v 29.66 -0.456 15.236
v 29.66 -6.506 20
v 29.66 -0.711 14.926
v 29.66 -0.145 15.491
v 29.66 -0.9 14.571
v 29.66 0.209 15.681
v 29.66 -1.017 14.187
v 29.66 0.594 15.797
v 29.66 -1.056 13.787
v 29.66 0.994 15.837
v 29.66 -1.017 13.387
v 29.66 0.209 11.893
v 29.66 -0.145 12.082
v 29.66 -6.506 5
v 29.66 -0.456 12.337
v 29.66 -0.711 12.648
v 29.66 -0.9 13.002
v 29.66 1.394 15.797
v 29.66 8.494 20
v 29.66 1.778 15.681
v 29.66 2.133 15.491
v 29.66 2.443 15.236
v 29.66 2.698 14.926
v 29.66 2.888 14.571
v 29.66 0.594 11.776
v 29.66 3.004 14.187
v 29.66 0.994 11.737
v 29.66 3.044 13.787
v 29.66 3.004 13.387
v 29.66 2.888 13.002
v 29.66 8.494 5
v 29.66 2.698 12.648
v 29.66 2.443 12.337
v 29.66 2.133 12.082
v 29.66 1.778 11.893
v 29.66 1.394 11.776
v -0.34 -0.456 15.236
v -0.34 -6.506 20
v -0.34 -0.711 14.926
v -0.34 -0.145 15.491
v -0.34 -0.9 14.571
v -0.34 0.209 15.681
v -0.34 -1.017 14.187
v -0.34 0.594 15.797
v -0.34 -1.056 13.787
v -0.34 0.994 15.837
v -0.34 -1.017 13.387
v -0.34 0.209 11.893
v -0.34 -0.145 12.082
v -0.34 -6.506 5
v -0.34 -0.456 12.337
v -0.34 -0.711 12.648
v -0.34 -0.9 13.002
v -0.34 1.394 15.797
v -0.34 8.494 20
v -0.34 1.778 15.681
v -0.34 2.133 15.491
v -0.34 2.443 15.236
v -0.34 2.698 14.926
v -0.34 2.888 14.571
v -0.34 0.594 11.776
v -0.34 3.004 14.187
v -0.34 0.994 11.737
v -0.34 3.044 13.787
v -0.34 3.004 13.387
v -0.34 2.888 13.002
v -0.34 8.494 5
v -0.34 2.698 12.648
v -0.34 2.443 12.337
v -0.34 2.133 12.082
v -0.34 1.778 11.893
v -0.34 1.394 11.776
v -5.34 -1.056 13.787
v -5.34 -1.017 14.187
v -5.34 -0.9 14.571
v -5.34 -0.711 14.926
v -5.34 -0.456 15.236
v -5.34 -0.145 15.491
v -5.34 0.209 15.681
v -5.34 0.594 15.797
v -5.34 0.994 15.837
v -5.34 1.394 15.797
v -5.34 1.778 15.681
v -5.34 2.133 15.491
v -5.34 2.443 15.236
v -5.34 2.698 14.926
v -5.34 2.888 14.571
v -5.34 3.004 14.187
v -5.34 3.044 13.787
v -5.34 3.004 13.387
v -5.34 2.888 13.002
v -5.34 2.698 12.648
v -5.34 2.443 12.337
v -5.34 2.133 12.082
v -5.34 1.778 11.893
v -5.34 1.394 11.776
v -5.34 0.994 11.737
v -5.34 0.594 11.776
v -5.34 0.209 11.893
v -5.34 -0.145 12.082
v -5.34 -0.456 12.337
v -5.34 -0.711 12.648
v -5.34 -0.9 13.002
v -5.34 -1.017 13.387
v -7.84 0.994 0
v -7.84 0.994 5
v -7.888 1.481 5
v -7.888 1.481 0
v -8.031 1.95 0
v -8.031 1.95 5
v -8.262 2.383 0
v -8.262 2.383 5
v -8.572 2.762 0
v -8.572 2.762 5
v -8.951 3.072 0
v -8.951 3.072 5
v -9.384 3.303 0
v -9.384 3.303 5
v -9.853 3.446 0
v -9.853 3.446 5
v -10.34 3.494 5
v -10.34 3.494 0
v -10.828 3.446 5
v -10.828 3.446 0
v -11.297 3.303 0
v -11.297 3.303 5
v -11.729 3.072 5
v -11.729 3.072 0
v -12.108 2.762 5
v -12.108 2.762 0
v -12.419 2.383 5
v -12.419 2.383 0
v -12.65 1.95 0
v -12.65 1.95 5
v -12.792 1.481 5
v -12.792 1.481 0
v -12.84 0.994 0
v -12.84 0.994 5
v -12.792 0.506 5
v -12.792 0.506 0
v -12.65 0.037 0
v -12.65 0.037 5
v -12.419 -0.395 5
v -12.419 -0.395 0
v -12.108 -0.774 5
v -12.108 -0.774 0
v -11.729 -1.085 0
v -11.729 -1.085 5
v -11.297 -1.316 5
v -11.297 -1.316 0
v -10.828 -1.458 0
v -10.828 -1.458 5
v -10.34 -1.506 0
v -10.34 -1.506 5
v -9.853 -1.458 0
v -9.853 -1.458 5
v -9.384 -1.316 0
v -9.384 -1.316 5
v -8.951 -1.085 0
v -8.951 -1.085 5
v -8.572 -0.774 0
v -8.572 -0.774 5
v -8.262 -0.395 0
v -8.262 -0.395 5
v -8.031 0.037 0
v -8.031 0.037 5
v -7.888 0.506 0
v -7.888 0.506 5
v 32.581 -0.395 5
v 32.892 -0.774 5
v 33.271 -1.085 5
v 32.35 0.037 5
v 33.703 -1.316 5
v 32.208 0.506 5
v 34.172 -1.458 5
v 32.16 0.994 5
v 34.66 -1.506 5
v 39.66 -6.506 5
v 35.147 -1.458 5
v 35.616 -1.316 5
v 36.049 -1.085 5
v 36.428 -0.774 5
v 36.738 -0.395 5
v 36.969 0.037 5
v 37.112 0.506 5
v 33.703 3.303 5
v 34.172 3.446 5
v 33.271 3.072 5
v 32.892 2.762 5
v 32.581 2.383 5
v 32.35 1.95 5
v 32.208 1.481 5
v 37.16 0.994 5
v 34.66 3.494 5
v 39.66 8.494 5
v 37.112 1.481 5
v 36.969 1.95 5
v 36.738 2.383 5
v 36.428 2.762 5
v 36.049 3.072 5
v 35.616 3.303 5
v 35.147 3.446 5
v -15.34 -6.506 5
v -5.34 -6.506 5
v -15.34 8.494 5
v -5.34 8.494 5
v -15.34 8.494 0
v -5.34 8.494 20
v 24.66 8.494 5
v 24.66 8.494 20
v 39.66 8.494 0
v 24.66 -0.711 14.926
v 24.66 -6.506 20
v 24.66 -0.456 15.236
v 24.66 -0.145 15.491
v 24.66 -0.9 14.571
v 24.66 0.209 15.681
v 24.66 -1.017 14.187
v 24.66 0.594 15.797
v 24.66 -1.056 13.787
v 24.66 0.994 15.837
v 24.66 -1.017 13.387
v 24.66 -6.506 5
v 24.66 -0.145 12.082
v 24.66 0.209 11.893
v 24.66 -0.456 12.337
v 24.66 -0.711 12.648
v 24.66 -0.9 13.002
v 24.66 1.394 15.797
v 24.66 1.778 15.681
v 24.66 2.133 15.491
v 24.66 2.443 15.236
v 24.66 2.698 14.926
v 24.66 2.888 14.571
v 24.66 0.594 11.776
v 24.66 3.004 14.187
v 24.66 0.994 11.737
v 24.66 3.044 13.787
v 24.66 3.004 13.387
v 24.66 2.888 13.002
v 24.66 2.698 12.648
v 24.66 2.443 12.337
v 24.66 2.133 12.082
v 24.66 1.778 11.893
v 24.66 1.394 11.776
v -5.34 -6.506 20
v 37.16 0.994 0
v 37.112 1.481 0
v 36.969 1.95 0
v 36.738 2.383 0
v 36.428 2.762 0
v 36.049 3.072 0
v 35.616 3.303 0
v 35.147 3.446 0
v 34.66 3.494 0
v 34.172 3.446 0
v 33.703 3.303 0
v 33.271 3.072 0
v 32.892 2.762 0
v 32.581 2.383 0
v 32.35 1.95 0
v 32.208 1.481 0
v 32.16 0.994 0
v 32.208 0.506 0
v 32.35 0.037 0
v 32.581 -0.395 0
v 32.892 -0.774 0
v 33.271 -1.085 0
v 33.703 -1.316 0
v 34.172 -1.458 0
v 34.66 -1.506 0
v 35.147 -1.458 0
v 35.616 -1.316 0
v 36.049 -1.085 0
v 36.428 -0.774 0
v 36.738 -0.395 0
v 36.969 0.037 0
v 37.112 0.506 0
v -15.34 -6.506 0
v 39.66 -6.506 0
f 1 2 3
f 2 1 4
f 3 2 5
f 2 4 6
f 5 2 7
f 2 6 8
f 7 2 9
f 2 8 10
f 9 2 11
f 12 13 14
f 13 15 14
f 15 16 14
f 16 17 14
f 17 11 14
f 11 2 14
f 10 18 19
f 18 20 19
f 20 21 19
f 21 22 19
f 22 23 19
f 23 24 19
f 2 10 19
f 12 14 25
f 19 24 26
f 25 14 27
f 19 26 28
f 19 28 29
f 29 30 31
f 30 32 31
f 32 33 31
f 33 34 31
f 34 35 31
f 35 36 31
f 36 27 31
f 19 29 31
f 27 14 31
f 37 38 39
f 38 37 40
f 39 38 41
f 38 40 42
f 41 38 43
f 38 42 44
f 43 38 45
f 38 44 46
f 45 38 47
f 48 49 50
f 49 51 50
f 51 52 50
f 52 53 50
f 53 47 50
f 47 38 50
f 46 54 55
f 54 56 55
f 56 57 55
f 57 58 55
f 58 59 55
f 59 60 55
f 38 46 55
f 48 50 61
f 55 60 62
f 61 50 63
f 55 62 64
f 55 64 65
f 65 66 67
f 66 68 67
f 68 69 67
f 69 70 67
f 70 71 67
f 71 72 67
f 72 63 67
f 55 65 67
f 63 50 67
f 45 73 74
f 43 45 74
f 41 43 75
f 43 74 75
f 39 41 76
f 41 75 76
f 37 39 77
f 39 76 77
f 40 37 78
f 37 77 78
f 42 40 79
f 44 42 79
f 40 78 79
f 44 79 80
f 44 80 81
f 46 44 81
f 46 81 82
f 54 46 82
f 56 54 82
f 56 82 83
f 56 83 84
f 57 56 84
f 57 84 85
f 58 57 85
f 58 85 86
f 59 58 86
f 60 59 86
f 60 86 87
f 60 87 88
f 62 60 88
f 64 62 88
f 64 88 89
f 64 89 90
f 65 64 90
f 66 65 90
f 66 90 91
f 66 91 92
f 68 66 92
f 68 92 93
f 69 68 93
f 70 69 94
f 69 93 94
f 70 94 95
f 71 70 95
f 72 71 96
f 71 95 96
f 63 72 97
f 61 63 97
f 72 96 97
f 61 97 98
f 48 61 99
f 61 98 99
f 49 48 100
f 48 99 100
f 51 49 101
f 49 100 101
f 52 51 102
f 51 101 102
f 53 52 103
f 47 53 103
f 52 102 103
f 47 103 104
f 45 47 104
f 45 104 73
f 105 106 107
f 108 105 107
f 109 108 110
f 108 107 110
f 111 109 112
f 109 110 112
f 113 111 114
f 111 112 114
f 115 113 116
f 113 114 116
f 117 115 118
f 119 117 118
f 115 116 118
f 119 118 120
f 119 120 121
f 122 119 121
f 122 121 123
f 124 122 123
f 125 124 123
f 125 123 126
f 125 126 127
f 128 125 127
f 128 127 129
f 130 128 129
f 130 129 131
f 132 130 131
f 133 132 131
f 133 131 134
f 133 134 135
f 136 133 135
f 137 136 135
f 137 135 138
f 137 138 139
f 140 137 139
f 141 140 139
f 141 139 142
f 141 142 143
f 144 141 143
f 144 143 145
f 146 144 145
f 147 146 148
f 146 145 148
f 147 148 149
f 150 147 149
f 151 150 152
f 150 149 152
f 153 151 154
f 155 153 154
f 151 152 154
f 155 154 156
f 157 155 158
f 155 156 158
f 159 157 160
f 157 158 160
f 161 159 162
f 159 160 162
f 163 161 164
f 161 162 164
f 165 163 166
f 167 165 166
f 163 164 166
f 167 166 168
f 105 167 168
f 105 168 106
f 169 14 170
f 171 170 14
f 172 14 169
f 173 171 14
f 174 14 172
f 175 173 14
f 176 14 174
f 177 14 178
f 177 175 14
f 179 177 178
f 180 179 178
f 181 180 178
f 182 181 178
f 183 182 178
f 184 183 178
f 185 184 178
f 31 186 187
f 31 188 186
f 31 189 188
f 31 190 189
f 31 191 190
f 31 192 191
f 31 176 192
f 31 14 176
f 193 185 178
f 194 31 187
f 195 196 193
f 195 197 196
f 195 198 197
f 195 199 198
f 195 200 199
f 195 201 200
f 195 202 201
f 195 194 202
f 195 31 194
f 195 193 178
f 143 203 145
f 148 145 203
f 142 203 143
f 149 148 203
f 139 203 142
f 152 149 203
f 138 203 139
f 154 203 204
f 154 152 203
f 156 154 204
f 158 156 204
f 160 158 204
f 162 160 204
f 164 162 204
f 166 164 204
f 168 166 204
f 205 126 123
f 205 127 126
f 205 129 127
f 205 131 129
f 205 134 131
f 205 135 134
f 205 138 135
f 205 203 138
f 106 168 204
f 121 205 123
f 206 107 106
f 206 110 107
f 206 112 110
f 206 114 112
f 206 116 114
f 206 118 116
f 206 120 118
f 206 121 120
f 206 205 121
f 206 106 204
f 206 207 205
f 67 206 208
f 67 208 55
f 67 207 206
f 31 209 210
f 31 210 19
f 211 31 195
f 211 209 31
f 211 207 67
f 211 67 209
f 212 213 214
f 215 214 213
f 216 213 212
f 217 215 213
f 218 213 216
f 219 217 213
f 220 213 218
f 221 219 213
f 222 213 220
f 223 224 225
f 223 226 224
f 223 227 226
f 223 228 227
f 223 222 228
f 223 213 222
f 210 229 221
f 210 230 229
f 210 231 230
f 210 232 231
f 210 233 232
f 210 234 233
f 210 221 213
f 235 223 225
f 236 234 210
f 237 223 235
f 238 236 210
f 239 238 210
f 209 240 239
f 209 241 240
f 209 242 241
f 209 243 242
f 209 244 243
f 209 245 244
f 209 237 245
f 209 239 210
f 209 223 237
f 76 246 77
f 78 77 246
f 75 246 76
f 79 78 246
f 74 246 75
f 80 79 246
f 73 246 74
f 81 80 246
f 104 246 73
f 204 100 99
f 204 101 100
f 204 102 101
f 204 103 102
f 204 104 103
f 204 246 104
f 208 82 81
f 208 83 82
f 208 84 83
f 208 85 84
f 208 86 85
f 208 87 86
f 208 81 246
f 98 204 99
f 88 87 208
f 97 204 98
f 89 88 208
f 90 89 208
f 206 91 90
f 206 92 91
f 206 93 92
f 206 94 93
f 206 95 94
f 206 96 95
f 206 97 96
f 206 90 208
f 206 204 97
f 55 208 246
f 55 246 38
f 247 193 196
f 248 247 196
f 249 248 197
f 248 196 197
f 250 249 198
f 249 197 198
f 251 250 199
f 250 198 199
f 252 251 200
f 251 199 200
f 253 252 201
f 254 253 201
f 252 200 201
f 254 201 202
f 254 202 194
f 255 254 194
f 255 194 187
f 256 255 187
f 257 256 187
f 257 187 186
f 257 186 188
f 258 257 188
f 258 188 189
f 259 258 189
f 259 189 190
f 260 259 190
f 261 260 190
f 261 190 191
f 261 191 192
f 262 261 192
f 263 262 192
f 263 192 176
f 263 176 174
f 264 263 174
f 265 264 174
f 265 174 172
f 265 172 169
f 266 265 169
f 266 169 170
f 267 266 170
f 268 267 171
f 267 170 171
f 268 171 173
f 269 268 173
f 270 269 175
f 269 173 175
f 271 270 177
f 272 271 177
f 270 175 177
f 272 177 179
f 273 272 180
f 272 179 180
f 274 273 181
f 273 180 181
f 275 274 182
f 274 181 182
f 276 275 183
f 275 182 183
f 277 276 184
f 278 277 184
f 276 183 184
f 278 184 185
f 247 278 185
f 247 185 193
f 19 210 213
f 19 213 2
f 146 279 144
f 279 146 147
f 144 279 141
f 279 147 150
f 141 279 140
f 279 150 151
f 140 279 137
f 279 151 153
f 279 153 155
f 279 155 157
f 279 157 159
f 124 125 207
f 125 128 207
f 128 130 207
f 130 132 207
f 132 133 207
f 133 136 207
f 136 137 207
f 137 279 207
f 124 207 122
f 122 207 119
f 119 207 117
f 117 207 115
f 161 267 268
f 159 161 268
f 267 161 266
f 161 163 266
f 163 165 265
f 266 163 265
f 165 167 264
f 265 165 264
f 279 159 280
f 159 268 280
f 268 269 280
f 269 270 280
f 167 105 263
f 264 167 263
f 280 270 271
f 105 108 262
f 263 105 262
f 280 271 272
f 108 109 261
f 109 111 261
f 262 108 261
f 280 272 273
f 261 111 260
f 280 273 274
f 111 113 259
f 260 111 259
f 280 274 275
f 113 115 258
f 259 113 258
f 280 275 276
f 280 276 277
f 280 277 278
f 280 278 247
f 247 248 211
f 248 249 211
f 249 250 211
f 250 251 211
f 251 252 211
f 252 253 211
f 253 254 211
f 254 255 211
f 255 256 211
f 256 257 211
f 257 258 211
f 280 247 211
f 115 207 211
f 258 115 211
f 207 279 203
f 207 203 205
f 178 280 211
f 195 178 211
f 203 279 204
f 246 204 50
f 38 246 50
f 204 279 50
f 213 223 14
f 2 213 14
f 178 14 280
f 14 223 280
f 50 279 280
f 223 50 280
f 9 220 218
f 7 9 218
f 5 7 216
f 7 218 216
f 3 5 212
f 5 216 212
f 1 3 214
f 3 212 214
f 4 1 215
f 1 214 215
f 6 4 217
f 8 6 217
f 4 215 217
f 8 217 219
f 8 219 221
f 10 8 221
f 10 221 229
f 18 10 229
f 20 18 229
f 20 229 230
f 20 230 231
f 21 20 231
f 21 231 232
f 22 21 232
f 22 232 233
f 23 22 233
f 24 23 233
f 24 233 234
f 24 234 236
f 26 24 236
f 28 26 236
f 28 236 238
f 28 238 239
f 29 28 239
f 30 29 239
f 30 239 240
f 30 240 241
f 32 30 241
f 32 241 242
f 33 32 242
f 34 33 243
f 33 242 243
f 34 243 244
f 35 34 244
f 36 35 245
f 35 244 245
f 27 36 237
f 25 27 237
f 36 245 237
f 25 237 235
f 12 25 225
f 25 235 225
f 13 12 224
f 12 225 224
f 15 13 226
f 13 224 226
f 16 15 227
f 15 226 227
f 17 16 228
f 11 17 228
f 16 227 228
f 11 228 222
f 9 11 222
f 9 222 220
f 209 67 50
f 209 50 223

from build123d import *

# Parameters (mm, degrees)
F0_W     = 55
F0_H     = 15
F1_DEPTH = 5
F2_W     = 5
F2_H     = 15
F3_DEPTH = 15
F4_R     = 2.5
F5_DEPTH = 25
F6_R     = 2.5
F7_DEPTH = 25
F8_R     = 2.05
F9_DEPTH = 45.001


with BuildPart() as f1:
    # F0 (on Top) → F1 (new body)
    with BuildSketch(Plane.XY):
        with Locations((12.159763, 0.993737)):
            Rectangle(F0_W, F0_H)
    extrude(amount=F1_DEPTH)

    # F2 (on face) → F3 (join)
    with BuildSketch(Plane.XY.offset(5)):
        with Locations((-2.840237, 0.993737)):
            Rectangle(F2_W, F2_H)
        with Locations((27.159763, 0.993737)):
            Rectangle(F2_W, F2_H)
    extrude(amount=F3_DEPTH)

    # F4 (on face) → F5 (cut)
    with BuildSketch(Plane.XY.offset(5)):
        with Locations((-10.340237, 0.993737)):
            Circle(F4_R)
    extrude(amount=-F5_DEPTH, mode=Mode.SUBTRACT)

    # F6 (on face) → F7 (cut)
    with BuildSketch(Plane.XY.offset(5)):
        with Locations((34.659763, 0.993737)):
            Circle(F6_R)
    extrude(amount=-F7_DEPTH, mode=Mode.SUBTRACT)

    # F8 (on face) → F9 (cut, through all)
    with BuildSketch(Plane(origin=(-5.340237, 0, 0), x_dir=(0, -1, 0), z_dir=(-1, 0, 0))):
        with Locations((-0.993737, 13.786643)):
            Circle(F8_R)
    extrude(amount=-F9_DEPTH, mode=Mode.SUBTRACT)


solid = f1.part
